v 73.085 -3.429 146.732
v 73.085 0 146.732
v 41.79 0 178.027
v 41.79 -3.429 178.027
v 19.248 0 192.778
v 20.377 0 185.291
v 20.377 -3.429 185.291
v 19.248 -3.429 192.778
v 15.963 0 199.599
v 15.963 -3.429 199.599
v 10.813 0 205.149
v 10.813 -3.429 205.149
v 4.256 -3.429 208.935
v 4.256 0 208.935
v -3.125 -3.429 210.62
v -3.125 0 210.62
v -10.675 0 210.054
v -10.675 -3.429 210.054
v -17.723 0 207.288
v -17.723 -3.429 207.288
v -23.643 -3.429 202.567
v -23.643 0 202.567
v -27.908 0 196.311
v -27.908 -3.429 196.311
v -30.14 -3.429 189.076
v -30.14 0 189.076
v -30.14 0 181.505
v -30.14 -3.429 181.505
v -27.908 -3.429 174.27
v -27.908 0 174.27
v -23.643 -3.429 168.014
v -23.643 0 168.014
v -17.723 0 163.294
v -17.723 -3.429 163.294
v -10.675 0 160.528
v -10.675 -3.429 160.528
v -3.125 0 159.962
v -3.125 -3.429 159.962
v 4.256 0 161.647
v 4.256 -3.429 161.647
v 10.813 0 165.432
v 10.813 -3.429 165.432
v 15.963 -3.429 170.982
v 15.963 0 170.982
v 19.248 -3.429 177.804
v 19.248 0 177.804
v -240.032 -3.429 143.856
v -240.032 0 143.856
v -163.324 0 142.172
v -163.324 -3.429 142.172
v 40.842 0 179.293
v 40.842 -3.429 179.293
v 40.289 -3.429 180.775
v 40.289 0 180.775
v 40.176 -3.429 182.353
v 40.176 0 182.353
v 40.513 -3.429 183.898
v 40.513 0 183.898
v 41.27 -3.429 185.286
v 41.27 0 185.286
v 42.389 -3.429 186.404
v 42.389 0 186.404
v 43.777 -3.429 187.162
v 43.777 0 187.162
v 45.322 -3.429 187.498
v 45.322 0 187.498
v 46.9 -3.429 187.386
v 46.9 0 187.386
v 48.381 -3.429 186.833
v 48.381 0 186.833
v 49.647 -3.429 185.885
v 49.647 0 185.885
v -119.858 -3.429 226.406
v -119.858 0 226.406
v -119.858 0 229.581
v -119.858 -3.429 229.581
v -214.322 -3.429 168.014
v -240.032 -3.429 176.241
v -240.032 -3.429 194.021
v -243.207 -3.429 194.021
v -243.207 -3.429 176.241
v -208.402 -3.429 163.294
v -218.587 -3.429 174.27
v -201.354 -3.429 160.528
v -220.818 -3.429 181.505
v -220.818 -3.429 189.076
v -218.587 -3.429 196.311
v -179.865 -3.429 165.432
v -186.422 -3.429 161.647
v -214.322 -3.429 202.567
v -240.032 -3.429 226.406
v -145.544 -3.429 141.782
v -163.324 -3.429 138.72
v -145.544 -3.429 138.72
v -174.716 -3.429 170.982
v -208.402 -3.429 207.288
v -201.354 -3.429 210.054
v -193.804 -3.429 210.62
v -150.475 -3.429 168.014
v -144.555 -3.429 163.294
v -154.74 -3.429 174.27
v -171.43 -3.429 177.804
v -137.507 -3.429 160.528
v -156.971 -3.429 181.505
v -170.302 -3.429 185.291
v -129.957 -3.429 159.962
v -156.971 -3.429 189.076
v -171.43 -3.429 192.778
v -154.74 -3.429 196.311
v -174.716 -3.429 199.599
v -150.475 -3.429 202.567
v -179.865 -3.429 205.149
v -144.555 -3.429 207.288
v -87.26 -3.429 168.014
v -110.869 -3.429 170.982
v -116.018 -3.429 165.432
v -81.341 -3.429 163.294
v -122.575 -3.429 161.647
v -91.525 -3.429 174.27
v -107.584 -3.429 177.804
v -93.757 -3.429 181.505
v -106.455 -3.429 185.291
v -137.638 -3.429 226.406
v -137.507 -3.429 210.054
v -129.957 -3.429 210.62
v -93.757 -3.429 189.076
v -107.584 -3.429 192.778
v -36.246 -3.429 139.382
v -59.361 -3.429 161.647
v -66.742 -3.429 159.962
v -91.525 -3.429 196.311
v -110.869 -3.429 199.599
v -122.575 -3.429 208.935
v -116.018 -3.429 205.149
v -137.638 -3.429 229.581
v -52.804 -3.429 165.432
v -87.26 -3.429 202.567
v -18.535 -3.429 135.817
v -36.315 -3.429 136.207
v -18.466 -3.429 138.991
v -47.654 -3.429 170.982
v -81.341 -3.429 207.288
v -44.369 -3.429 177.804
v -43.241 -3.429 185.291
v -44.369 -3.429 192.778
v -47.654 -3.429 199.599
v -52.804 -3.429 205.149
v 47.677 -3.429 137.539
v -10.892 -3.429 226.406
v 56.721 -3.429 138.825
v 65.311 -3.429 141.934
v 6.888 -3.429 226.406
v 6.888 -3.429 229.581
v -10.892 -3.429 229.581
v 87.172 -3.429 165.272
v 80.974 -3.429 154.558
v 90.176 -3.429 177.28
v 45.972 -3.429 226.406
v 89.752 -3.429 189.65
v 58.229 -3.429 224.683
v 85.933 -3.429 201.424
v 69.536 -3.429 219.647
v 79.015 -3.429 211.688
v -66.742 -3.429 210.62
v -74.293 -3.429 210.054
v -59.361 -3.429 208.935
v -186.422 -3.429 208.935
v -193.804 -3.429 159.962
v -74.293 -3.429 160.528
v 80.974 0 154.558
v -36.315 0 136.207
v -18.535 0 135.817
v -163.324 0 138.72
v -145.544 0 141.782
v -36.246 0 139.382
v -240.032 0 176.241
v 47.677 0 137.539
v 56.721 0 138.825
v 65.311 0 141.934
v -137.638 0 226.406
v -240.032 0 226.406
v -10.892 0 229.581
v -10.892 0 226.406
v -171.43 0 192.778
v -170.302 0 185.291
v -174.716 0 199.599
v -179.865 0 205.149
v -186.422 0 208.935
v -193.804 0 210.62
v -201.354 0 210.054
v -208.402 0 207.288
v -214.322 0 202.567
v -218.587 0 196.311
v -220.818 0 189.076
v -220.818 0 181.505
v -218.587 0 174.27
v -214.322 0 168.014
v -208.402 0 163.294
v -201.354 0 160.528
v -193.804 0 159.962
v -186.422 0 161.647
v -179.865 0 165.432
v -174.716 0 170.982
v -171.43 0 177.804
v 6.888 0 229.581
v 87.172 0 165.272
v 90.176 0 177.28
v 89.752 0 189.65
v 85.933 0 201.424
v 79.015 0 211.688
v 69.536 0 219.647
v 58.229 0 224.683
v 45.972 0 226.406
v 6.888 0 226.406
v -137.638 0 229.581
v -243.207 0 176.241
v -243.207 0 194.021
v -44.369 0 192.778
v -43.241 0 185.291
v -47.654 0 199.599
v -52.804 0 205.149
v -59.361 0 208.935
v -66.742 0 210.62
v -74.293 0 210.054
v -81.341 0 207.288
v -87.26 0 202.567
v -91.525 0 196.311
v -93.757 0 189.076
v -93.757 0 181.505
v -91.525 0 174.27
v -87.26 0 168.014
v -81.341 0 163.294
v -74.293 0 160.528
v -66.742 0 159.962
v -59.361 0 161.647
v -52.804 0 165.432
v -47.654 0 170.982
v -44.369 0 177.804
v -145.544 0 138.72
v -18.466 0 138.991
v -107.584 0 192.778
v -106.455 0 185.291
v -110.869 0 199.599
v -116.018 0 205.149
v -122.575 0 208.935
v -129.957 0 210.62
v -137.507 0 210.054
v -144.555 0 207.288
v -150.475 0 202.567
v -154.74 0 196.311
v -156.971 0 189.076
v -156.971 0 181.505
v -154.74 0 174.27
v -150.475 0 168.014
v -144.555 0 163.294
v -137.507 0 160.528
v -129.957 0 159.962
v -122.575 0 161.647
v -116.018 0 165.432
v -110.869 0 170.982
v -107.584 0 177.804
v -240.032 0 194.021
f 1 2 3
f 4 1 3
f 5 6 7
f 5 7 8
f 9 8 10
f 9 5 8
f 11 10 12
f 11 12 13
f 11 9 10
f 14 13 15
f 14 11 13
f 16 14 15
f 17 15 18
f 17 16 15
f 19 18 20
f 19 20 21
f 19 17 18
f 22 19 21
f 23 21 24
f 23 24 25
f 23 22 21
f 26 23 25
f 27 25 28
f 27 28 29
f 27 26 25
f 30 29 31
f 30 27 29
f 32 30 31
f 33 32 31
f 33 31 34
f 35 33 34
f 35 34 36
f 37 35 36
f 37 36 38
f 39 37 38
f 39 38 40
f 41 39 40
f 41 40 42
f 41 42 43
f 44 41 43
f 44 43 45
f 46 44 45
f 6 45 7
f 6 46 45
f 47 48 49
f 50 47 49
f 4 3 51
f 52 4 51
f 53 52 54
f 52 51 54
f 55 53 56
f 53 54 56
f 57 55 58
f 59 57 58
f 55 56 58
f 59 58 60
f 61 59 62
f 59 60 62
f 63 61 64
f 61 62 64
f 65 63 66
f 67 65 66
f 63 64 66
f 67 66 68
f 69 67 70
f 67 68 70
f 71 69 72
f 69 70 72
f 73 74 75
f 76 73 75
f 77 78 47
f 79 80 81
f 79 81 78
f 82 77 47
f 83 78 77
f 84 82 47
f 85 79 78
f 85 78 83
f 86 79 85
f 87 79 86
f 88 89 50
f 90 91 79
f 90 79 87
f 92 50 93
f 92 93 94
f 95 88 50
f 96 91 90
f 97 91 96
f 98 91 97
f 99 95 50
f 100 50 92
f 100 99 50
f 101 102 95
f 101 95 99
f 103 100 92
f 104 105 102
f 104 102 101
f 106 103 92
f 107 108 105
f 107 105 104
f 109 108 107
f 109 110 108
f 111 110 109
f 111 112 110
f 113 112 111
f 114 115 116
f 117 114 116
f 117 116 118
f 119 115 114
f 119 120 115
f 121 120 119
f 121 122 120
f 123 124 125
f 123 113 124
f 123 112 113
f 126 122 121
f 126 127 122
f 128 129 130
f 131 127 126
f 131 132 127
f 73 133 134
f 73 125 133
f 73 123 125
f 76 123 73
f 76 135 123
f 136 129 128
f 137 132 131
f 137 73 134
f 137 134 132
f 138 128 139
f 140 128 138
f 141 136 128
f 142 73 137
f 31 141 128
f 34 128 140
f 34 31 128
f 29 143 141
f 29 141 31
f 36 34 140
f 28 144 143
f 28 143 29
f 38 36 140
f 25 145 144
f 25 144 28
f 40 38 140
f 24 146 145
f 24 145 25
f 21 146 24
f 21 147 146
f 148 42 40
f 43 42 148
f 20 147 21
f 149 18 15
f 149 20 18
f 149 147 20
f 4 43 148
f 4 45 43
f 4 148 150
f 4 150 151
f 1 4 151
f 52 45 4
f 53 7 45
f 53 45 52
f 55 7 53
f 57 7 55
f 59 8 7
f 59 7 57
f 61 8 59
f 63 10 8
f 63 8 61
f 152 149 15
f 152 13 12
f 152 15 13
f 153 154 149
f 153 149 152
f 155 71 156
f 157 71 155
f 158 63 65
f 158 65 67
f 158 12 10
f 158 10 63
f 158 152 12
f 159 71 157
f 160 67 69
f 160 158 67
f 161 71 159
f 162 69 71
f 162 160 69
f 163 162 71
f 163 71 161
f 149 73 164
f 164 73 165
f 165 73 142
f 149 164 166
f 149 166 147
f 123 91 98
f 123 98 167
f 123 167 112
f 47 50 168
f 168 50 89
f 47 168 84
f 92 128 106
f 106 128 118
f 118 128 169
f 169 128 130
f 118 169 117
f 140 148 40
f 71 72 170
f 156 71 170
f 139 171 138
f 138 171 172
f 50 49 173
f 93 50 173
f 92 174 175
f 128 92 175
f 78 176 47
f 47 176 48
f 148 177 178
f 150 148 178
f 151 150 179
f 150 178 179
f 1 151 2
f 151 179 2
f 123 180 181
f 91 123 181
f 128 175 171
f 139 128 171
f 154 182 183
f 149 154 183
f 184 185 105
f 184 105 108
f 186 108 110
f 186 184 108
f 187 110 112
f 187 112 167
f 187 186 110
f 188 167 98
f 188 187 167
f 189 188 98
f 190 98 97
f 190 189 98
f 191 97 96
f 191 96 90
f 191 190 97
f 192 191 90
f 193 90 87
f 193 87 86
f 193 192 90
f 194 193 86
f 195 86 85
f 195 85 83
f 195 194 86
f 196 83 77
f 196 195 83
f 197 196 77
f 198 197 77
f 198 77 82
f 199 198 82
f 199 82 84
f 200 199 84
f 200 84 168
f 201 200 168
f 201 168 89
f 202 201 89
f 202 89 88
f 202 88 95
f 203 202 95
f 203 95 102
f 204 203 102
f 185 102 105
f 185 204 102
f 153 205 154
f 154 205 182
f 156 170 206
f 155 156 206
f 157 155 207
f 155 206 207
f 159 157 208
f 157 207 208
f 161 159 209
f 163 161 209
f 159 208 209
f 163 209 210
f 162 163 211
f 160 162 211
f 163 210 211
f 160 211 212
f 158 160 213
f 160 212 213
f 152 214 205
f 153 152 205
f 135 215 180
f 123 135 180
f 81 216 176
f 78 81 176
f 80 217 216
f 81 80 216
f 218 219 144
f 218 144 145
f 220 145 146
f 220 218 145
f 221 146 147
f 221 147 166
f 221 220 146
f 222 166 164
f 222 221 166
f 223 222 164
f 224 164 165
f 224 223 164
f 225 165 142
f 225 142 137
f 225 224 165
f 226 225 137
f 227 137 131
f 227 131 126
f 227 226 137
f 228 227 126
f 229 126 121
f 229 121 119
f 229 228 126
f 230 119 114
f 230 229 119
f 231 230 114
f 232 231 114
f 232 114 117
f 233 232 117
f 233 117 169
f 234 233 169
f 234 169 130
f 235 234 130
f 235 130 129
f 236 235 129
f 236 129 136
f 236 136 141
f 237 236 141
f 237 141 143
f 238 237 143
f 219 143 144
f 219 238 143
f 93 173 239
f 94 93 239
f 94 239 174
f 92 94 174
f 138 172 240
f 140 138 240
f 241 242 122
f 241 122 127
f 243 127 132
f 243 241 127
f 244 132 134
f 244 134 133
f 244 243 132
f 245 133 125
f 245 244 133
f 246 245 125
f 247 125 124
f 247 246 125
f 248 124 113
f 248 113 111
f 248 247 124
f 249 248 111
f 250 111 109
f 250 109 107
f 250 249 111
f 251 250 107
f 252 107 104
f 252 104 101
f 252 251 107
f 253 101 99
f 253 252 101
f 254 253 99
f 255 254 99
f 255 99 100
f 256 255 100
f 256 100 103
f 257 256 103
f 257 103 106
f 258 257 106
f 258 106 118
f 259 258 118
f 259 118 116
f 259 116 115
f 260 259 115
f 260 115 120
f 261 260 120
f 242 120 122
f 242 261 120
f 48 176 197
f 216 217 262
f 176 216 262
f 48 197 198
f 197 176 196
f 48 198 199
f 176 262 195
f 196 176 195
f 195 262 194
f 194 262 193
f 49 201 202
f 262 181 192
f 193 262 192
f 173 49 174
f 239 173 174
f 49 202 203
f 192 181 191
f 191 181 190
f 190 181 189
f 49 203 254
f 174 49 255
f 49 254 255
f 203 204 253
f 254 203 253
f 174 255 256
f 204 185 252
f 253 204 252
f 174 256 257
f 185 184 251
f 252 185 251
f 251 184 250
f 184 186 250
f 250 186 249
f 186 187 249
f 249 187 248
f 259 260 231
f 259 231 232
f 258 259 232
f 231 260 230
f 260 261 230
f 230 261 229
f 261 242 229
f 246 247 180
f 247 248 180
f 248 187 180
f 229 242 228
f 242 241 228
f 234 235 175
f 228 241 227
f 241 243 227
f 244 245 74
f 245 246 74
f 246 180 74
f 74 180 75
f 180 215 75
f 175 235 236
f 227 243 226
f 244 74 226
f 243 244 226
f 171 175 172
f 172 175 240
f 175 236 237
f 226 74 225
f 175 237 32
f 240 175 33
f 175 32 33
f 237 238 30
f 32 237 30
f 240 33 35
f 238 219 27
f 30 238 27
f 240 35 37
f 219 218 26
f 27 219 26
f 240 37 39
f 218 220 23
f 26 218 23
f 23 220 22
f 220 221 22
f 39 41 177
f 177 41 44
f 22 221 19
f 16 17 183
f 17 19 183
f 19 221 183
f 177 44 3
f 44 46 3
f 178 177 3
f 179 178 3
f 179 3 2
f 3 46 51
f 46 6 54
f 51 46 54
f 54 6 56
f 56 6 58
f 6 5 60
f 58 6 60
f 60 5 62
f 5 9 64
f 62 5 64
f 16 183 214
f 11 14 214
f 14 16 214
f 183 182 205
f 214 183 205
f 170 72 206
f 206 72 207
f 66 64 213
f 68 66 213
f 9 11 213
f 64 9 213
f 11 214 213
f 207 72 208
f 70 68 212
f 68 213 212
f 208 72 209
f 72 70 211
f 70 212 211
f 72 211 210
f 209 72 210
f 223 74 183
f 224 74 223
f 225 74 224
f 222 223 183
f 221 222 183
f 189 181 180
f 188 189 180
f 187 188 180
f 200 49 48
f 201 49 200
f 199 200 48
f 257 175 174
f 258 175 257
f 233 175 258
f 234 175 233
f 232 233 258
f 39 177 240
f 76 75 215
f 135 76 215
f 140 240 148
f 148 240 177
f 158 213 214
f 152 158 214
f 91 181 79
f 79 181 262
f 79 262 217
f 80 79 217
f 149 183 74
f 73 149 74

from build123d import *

# Parameters (mm, degrees)
F0_R     = 25.4
F1_DEPTH = 3.429


# Not quite as in the source:
# - ends of sketch curves that miss each other by under 0.0002 mm in the source are joined


with BuildPart() as f1:
    # F0 (on Front) → F1 (new body)
    with BuildSketch(Plane.XZ):
        with BuildLine():
            ThreePointArc((41.7896266471, 178.027378047), (41.789613947, 185.885114853), (49.647350753, 185.8851021529))
            Line((49.647350753, 185.8851021529), (80.9744634, 154.557984))
            ThreePointArc((80.9744634, 154.557984), (85.932800118, 201.4235329487), (45.972476, 226.4062528))
            Line((45.972476, 226.4062528), (6.888226, 226.4062528))
            Line((6.888226, 226.4062528), (6.888226, 229.5812528))
            Line((6.888226, 229.5812528), (-10.891774, 229.5812528))
            Line((-10.891774, 229.5812528), (-10.891774, 226.4062528))
            Line((-10.891774, 226.4062528), (-119.857774, 226.4062528))
            Line((-119.857774, 226.4062528), (-119.857774, 229.5812528))
            Line((-119.857774, 229.5812528), (-137.637774, 229.5812528))
            Line((-137.637774, 229.5812528), (-137.637774, 226.4062528))
            Line((-137.637774, 226.4062528), (-240.031524, 226.4062528))
            Line((-240.031524, 226.4062528), (-240.031524, 194.0212528))
            Line((-240.031524, 194.0212528), (-243.206524, 194.0212528))
            Line((-243.206524, 194.0212528), (-243.206524, 176.2412528))
            Line((-243.206524, 176.2412528), (-240.031524, 176.2412528))
            Line((-240.031524, 176.2412528), (-240.031524, 143.8562528))
            Line((-240.031524, 143.8562528), (-163.323524, 142.1719534))
            Line((-163.323524, 142.1719534), (-163.323524, 138.7199156))
            Line((-163.323524, 138.7199156), (-145.543524, 138.7199156))
            Line((-145.543524, 138.7199156), (-145.543524, 141.7815554))
            Line((-145.543524, 141.7815554), (-36.2456222, 139.3816618))
            Line((-36.2456222, 139.3816618), (-36.3153198, 136.2074238))
            Line((-36.3153198, 136.2074238), (-18.5353198, 135.8170258))
            Line((-18.5353198, 135.8170258), (-18.4656222, 138.9912638))
            Line((-18.4656222, 138.9912638), (47.67707, 137.5389426))
            ThreePointArc((47.67707, 137.5389426), (61.0963656021, 140.1582808001), (73.0847311317, 146.7322819609))
            Line((73.0847311317, 146.7322819609), (41.7896266471, 178.027378047))
        make_face()
        with Locations((-195.7019962, 185.2907394)):
            Circle(F0_R, mode=Mode.SUBTRACT)
        with Locations((-131.8551084, 185.2907394)):
            Circle(F0_R, mode=Mode.SUBTRACT)
        with Locations((-68.6405282, 185.2907394)):
            Circle(F0_R, mode=Mode.SUBTRACT)
        with Locations((-5.0234596, 185.2907394)):
            Circle(F0_R, mode=Mode.SUBTRACT)
    extrude(amount=F1_DEPTH)


solid = f1.part
